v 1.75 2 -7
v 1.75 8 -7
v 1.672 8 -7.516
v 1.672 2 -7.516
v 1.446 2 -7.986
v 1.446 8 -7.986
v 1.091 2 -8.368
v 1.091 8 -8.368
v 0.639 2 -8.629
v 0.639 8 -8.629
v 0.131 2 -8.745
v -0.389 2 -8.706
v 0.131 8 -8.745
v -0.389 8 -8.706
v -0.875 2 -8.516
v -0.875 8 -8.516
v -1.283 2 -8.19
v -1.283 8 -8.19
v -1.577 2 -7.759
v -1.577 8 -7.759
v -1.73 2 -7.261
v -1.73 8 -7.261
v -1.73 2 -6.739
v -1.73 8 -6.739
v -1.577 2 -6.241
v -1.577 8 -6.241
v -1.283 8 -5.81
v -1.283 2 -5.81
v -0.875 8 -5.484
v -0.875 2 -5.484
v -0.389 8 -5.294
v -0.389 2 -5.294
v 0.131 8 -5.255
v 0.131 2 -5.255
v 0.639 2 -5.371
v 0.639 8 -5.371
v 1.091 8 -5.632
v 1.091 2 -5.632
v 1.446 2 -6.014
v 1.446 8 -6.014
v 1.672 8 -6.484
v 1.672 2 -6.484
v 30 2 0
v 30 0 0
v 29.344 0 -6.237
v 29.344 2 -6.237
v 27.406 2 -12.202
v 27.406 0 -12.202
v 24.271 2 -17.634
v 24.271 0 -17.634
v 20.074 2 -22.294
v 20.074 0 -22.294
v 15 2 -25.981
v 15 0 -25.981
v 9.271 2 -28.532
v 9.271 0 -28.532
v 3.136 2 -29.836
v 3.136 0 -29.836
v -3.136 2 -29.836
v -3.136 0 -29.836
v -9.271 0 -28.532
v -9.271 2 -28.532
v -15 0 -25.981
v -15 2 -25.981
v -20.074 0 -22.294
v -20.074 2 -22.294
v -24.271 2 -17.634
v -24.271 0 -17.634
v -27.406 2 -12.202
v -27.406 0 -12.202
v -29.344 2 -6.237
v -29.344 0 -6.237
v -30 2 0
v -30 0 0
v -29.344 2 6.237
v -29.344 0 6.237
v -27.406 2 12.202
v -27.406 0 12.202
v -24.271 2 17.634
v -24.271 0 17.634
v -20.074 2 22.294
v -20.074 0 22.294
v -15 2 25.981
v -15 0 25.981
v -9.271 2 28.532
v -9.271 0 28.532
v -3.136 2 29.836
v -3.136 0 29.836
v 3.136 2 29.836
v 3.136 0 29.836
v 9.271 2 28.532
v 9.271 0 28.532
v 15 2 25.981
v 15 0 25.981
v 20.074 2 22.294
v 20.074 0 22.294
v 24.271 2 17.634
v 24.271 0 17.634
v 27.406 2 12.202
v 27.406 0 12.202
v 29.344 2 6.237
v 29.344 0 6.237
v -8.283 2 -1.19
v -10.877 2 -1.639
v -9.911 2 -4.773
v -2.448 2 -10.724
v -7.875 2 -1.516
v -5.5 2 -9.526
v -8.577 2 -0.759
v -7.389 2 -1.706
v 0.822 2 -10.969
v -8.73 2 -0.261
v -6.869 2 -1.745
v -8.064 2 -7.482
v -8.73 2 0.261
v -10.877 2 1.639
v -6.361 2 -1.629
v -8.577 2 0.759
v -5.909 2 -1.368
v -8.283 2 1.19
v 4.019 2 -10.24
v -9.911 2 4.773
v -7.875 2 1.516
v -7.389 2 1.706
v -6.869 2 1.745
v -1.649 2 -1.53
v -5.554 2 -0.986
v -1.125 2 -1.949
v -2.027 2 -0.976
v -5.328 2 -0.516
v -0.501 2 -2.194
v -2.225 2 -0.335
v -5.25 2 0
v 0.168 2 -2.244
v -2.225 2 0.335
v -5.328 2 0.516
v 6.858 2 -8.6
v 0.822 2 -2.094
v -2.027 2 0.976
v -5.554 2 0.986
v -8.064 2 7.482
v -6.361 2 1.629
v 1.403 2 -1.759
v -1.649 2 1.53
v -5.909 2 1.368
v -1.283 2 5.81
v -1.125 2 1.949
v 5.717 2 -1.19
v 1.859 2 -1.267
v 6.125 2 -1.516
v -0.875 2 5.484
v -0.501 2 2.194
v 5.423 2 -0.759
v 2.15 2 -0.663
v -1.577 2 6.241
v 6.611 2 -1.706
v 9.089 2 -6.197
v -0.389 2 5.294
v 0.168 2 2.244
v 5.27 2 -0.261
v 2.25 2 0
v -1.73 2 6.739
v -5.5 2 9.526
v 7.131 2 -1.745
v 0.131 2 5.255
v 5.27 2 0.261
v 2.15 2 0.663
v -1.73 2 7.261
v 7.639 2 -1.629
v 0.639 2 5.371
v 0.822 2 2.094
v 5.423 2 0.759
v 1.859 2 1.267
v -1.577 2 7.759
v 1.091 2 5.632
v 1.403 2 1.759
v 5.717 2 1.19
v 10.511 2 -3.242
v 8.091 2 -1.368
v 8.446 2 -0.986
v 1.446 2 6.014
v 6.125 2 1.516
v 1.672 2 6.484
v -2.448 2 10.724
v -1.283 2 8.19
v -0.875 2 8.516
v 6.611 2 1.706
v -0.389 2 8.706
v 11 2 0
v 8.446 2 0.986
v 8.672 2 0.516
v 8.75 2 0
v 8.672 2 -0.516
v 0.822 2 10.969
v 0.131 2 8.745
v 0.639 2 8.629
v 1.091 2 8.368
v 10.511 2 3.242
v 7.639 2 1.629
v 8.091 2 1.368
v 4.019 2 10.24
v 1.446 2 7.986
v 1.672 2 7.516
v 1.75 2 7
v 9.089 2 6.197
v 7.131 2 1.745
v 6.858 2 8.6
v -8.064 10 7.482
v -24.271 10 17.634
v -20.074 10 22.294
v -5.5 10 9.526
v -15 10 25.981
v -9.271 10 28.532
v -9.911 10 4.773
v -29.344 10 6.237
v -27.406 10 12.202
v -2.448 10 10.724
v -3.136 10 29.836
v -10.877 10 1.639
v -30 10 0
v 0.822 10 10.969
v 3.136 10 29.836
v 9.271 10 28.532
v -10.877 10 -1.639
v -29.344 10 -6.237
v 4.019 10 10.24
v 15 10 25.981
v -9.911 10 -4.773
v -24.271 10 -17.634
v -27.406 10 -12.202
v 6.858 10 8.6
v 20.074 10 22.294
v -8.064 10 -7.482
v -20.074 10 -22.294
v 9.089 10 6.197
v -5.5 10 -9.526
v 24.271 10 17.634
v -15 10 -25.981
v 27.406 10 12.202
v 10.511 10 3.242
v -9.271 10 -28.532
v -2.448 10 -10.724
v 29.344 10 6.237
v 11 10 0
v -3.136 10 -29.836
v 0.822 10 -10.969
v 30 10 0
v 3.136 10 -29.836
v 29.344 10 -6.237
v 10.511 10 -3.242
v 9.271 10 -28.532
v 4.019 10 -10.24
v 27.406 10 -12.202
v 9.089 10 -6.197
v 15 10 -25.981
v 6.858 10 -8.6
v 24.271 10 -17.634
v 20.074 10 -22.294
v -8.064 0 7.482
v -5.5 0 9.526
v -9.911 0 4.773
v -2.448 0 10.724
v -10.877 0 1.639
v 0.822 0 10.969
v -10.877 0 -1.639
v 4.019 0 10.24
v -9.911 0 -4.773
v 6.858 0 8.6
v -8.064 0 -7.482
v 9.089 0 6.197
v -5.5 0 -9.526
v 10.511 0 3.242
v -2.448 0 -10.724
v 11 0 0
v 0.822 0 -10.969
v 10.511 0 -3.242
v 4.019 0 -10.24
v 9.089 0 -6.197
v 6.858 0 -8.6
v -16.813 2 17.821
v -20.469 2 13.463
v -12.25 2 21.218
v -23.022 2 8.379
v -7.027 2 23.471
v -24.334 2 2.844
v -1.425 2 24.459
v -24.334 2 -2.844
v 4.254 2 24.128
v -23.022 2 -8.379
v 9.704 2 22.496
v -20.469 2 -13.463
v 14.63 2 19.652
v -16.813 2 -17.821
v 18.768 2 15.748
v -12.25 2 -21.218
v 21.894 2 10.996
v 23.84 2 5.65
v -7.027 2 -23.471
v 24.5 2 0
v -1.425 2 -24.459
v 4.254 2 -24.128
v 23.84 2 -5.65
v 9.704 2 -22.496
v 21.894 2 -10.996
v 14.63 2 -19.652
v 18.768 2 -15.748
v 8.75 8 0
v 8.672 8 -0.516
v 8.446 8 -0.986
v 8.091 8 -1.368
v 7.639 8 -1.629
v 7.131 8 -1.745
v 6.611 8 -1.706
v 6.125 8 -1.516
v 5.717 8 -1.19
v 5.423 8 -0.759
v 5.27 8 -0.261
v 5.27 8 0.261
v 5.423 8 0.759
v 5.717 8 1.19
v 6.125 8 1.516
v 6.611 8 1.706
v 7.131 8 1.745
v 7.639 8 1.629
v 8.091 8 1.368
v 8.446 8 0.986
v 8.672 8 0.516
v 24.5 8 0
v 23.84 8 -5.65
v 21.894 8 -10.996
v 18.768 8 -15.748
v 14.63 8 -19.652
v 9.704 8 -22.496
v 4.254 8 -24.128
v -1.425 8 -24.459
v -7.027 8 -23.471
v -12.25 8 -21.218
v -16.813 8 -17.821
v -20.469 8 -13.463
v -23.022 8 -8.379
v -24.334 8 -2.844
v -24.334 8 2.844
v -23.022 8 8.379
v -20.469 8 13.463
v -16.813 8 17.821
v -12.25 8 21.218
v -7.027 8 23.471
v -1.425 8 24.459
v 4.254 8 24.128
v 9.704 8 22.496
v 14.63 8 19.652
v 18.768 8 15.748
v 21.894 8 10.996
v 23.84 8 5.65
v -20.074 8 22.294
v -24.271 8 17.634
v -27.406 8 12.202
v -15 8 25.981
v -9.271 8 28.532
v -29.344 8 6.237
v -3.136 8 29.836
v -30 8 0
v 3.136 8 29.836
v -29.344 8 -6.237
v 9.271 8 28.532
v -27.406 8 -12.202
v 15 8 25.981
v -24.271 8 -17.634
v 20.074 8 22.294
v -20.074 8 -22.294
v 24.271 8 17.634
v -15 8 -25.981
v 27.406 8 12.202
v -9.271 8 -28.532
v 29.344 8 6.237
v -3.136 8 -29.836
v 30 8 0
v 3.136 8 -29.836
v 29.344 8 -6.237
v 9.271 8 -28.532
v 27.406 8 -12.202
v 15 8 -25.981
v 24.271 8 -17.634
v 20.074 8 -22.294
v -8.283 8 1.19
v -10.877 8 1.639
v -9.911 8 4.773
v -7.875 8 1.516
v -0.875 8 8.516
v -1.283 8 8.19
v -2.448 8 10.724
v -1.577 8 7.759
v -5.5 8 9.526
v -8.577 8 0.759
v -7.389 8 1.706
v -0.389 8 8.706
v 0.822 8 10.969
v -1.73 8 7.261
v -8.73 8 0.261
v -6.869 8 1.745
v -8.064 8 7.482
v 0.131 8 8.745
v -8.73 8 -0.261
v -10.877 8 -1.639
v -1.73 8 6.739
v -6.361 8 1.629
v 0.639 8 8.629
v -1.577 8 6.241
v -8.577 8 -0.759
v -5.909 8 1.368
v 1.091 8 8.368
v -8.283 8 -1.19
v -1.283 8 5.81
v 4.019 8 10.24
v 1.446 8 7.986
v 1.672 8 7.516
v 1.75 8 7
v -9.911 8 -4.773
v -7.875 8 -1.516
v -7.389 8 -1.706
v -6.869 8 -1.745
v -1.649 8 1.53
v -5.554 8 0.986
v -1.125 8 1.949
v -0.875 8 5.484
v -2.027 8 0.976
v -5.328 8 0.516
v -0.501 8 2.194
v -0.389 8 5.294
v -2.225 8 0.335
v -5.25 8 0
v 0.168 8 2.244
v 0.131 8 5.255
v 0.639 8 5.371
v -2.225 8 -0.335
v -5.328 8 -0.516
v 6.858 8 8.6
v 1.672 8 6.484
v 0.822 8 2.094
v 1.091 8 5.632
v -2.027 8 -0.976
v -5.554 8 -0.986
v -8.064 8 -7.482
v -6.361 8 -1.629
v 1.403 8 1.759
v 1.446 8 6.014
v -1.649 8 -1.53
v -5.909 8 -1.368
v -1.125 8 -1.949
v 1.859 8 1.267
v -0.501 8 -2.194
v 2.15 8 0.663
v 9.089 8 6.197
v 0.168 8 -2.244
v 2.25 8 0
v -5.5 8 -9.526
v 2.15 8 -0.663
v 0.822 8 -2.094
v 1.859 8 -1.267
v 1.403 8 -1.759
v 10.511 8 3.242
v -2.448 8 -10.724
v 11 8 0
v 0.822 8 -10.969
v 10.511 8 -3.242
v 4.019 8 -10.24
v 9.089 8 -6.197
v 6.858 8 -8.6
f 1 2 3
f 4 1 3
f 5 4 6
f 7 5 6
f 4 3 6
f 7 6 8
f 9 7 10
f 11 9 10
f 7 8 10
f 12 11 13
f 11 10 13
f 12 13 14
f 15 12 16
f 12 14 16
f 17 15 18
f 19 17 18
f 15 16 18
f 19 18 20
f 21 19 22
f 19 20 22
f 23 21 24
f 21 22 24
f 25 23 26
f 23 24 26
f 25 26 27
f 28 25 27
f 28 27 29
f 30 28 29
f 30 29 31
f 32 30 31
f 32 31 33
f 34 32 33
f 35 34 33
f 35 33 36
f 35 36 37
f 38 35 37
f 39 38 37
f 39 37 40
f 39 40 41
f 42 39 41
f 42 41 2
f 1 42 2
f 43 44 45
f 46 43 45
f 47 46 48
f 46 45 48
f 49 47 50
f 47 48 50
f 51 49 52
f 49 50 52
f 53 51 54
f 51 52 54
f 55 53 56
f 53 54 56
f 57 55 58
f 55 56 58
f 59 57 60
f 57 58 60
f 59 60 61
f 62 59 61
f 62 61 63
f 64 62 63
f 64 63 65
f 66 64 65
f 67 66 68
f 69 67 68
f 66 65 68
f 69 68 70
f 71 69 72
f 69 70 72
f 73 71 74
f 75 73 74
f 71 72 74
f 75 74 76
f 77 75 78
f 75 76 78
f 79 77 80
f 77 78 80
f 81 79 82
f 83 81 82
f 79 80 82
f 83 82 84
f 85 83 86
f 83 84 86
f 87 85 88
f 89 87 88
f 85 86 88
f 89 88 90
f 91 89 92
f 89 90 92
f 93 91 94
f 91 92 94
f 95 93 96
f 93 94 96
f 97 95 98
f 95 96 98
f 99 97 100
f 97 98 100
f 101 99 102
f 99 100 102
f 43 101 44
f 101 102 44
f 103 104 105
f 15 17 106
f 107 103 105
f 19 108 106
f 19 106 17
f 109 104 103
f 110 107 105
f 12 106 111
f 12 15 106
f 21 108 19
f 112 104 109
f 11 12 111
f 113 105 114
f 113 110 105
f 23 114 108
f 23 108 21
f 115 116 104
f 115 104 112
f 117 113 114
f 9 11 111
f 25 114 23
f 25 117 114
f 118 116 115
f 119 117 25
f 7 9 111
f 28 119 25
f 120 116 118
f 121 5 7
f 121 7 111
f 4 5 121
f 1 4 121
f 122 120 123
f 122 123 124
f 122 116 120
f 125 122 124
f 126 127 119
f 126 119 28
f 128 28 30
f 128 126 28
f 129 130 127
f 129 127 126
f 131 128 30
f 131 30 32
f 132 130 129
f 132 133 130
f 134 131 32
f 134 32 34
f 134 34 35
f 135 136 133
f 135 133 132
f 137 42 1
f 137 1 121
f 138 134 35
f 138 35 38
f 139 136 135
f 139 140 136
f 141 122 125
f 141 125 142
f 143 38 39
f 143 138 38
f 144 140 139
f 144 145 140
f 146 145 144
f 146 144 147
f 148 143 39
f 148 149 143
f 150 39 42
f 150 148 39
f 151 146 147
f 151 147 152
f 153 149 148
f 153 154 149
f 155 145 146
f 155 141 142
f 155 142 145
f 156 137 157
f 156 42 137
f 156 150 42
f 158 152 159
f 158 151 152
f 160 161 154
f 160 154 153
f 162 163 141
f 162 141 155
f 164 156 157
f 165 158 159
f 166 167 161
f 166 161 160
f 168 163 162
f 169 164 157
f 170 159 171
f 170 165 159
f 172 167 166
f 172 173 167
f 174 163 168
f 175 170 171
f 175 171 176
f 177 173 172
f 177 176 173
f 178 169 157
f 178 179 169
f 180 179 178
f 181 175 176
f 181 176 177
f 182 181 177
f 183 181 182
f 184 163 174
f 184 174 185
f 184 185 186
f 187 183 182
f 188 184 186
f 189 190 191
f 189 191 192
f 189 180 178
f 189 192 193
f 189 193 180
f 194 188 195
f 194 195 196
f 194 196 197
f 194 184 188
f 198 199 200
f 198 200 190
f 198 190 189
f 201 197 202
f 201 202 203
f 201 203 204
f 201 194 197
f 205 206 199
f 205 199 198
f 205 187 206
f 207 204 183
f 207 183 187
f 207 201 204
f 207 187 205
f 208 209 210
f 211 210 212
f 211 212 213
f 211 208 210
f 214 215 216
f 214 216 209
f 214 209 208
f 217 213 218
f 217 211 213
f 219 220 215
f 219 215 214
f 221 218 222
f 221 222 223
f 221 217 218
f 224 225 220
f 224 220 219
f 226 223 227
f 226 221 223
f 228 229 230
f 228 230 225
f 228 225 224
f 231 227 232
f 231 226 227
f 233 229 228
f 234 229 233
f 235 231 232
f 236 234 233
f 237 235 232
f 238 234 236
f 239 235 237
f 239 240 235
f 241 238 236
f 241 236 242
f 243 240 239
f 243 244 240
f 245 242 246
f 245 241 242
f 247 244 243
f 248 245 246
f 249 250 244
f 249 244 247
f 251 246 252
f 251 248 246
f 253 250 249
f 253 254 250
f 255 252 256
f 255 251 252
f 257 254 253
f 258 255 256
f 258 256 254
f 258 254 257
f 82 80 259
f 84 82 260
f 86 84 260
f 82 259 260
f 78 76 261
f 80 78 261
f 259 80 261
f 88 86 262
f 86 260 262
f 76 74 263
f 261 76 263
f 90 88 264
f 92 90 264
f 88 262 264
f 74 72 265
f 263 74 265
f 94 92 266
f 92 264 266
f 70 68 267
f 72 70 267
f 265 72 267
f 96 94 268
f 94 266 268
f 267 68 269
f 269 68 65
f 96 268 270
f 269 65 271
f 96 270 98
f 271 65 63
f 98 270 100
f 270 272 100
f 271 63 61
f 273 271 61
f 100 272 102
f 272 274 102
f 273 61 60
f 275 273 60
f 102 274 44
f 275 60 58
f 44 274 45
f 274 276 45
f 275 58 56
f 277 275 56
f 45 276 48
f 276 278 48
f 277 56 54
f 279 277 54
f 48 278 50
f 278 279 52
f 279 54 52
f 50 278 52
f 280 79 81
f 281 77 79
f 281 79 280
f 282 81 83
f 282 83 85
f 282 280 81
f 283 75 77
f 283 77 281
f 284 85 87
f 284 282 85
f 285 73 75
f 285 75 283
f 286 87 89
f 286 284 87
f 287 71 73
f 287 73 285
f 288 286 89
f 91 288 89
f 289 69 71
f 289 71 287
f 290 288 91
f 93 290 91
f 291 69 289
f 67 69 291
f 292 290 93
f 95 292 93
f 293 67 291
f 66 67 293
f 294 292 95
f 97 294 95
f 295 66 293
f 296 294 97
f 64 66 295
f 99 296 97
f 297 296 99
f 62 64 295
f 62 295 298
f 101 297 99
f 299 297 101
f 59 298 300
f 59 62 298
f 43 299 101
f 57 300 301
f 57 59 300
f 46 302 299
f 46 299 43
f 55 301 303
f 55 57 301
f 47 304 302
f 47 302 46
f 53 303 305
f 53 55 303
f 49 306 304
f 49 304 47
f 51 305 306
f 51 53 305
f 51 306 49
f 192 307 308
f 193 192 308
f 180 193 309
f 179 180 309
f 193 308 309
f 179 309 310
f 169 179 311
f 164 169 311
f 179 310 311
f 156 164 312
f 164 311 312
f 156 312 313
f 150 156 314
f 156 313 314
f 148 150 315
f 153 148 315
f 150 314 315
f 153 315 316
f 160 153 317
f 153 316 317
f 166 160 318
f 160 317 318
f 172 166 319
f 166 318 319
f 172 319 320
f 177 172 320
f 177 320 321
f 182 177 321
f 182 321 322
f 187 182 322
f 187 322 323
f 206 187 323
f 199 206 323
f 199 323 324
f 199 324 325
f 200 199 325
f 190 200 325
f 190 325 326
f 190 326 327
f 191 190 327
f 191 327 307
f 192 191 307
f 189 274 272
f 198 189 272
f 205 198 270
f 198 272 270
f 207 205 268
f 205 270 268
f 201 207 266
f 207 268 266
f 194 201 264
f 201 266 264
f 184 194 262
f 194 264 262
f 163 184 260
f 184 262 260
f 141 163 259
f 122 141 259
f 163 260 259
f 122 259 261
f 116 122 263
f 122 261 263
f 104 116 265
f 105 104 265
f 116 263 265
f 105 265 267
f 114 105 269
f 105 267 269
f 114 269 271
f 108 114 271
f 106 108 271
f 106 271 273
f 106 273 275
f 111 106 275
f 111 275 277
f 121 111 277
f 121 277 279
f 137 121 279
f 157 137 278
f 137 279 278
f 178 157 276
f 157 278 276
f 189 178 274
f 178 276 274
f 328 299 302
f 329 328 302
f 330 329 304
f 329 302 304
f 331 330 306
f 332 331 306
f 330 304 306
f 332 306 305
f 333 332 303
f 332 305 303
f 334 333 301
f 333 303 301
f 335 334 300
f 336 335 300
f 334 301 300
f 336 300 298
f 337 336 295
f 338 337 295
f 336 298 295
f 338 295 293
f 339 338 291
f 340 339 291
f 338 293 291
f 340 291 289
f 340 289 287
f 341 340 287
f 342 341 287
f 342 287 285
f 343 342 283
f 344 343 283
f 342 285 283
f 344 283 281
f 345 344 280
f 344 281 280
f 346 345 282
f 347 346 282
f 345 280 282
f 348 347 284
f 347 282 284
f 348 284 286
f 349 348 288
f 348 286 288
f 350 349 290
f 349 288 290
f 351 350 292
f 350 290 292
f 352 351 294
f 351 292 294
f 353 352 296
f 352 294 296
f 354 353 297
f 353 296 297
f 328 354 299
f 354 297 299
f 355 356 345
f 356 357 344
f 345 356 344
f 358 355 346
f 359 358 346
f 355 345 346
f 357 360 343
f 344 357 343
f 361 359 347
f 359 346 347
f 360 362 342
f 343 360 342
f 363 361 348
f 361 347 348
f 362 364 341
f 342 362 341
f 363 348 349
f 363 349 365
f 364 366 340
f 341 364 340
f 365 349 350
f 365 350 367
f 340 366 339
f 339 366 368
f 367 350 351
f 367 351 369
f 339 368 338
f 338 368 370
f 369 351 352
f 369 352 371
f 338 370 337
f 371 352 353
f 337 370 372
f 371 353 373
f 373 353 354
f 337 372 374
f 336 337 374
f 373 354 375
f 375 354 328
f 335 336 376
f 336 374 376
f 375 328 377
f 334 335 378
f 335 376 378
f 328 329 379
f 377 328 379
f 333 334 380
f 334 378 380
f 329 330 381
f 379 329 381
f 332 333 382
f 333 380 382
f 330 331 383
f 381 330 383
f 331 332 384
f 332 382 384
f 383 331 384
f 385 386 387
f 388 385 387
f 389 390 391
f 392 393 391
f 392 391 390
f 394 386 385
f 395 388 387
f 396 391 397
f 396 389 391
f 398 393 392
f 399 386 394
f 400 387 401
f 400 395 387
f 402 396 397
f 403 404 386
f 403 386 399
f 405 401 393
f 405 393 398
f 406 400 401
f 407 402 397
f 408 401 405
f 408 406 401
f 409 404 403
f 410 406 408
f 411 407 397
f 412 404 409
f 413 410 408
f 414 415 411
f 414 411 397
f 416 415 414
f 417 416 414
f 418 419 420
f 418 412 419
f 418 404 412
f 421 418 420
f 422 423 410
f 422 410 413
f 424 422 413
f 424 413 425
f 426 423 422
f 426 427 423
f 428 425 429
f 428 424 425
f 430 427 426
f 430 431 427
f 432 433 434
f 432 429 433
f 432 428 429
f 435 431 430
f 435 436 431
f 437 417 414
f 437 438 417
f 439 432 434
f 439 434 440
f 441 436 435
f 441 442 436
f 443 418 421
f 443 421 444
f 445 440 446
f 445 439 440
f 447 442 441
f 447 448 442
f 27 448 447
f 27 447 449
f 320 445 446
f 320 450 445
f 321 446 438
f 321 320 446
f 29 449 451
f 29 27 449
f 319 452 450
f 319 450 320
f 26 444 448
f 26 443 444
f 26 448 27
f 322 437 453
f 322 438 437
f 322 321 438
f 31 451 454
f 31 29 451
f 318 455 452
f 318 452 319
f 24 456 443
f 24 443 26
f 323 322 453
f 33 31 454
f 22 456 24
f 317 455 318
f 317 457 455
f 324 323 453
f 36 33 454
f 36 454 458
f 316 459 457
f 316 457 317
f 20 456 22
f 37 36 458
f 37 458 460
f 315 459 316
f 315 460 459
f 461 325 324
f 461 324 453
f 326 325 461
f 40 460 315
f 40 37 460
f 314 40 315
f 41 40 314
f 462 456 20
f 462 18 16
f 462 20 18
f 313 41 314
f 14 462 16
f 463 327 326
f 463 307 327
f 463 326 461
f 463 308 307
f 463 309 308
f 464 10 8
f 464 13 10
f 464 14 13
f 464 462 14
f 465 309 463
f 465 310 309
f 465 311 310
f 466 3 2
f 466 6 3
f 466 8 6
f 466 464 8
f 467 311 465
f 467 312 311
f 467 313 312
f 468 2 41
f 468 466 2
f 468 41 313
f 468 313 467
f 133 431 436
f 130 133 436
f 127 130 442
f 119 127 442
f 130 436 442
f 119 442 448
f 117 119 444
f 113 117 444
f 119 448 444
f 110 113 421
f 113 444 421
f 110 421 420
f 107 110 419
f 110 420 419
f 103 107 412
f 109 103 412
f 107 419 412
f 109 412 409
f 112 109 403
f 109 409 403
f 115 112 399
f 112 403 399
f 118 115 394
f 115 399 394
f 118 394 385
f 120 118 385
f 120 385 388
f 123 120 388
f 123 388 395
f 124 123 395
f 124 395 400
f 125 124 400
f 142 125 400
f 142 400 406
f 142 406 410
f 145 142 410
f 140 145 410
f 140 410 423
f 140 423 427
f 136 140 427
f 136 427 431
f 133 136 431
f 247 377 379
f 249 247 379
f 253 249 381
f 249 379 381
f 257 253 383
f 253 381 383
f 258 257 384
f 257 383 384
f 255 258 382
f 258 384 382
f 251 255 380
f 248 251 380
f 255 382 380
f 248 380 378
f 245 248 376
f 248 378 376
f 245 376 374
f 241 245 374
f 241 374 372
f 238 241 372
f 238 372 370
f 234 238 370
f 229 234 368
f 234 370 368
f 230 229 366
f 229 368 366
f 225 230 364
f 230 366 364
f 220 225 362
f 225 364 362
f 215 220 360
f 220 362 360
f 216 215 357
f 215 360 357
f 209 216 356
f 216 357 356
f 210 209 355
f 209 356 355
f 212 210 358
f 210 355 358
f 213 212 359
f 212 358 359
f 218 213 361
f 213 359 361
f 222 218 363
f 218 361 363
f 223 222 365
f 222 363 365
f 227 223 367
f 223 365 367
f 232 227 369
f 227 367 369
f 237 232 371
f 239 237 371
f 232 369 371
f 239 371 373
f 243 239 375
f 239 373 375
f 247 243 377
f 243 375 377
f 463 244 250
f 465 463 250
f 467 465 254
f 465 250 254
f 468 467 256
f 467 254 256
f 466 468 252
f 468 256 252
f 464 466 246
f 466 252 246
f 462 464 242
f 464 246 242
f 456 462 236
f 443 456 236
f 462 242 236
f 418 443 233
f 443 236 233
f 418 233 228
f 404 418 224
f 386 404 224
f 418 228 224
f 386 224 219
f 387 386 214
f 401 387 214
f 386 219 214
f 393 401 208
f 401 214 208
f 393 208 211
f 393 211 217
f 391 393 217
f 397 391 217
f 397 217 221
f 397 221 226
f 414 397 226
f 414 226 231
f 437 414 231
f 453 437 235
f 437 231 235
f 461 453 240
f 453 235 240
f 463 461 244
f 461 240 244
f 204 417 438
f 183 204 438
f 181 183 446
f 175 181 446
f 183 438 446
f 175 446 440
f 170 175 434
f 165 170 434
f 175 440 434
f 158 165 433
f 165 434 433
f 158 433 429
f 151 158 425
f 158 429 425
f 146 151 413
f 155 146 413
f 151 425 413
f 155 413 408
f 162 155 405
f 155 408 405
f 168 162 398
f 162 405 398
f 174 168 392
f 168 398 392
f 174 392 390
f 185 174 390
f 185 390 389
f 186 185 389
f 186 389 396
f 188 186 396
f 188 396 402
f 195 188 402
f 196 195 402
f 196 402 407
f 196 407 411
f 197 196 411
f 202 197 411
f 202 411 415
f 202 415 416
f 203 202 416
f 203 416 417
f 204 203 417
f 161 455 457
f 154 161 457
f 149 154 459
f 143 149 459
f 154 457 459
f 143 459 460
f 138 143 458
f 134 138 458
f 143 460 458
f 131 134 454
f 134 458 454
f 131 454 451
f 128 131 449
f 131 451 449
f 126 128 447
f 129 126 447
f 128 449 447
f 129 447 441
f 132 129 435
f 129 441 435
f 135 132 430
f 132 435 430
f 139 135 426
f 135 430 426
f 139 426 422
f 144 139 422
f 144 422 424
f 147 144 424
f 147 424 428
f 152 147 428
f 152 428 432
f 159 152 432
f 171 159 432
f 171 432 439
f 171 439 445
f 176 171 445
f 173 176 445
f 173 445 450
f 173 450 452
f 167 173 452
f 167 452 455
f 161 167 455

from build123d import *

# Parameters (mm, degrees)
SKETCH1_R           = 30
BOSS_EXTRUDE1_DEPTH = 2
SKETCH2_R           = 24.5
BOSS_EXTRUDE2_DEPTH = 6
SKETCH3_R           = 30
BOSS_EXTRUDE3_DEPTH = 2
SKETCH4_R           = 11
SKETCH4_R_2         = 2.25
CUT_EXTRUDE1_DEPTH  = 2
SKETCH5_R           = 2.25
CUT_EXTRUDE2_DEPTH  = 27
SKETCH6_R           = 1.75
CUT_EXTRUDE3_DEPTH  = 27
SKETCH7_R           = 11
CUT_EXTRUDE4_DEPTH  = 2


with BuildPart() as part:
    # Sketch1 → Boss-Extrude1 (new body)
    with BuildSketch(Plane(origin=(0, 0, 0), x_dir=(1, 0, 0), z_dir=(0, 1, 0))):
        Circle(SKETCH1_R)
    extrude(amount=BOSS_EXTRUDE1_DEPTH)

    # Sketch2 → Boss-Extrude2 (add)
    with BuildSketch(Plane(origin=(0, 2, 0), x_dir=(1, 0, 0), z_dir=(0, 1, 0))):
        Circle(SKETCH2_R)
    extrude(amount=BOSS_EXTRUDE2_DEPTH)

    # Sketch3 → Boss-Extrude3 (add)
    with BuildSketch(Plane(origin=(0, 8, 0), x_dir=(1, 0, 0), z_dir=(0, 1, 0))):
        Circle(SKETCH3_R)
    extrude(amount=BOSS_EXTRUDE3_DEPTH)

    # Sketch4 → Cut-Extrude1 (cut)
    with BuildSketch(Plane(origin=(0, 10, 0), x_dir=(1, 0, 0), z_dir=(0, 1, 0))):
        Circle(SKETCH4_R)
        Circle(SKETCH4_R_2, mode=Mode.SUBTRACT)
    extrude(amount=-CUT_EXTRUDE1_DEPTH, mode=Mode.SUBTRACT)

    # Sketch5 → Cut-Extrude2 (cut)
    with BuildSketch(Plane(origin=(0, 10, 0), x_dir=(1, 0, 0), z_dir=(0, 1, 0))):
        Circle(SKETCH5_R)
    extrude(amount=-CUT_EXTRUDE2_DEPTH, mode=Mode.SUBTRACT)

    # Sketch6 → Cut-Extrude3 (cut)
    with BuildSketch(Plane(origin=(0, 8, 0), x_dir=(1, 0, 0), z_dir=(0, 1, 0))):
        with Locations((0, 7)):
            Circle(SKETCH6_R)
        with Locations((7, 0)):
            Circle(SKETCH6_R)
        with Locations((0, -7)):
            Circle(SKETCH6_R)
        with Locations((-7, 0)):
            Circle(SKETCH6_R)
    extrude(amount=-CUT_EXTRUDE3_DEPTH, mode=Mode.SUBTRACT)

    # Sketch7 → Cut-Extrude4 (cut)
    with BuildSketch(Plane.XZ):
        Circle(SKETCH7_R)
    extrude(amount=-CUT_EXTRUDE4_DEPTH, mode=Mode.SUBTRACT)


solid = part.part
